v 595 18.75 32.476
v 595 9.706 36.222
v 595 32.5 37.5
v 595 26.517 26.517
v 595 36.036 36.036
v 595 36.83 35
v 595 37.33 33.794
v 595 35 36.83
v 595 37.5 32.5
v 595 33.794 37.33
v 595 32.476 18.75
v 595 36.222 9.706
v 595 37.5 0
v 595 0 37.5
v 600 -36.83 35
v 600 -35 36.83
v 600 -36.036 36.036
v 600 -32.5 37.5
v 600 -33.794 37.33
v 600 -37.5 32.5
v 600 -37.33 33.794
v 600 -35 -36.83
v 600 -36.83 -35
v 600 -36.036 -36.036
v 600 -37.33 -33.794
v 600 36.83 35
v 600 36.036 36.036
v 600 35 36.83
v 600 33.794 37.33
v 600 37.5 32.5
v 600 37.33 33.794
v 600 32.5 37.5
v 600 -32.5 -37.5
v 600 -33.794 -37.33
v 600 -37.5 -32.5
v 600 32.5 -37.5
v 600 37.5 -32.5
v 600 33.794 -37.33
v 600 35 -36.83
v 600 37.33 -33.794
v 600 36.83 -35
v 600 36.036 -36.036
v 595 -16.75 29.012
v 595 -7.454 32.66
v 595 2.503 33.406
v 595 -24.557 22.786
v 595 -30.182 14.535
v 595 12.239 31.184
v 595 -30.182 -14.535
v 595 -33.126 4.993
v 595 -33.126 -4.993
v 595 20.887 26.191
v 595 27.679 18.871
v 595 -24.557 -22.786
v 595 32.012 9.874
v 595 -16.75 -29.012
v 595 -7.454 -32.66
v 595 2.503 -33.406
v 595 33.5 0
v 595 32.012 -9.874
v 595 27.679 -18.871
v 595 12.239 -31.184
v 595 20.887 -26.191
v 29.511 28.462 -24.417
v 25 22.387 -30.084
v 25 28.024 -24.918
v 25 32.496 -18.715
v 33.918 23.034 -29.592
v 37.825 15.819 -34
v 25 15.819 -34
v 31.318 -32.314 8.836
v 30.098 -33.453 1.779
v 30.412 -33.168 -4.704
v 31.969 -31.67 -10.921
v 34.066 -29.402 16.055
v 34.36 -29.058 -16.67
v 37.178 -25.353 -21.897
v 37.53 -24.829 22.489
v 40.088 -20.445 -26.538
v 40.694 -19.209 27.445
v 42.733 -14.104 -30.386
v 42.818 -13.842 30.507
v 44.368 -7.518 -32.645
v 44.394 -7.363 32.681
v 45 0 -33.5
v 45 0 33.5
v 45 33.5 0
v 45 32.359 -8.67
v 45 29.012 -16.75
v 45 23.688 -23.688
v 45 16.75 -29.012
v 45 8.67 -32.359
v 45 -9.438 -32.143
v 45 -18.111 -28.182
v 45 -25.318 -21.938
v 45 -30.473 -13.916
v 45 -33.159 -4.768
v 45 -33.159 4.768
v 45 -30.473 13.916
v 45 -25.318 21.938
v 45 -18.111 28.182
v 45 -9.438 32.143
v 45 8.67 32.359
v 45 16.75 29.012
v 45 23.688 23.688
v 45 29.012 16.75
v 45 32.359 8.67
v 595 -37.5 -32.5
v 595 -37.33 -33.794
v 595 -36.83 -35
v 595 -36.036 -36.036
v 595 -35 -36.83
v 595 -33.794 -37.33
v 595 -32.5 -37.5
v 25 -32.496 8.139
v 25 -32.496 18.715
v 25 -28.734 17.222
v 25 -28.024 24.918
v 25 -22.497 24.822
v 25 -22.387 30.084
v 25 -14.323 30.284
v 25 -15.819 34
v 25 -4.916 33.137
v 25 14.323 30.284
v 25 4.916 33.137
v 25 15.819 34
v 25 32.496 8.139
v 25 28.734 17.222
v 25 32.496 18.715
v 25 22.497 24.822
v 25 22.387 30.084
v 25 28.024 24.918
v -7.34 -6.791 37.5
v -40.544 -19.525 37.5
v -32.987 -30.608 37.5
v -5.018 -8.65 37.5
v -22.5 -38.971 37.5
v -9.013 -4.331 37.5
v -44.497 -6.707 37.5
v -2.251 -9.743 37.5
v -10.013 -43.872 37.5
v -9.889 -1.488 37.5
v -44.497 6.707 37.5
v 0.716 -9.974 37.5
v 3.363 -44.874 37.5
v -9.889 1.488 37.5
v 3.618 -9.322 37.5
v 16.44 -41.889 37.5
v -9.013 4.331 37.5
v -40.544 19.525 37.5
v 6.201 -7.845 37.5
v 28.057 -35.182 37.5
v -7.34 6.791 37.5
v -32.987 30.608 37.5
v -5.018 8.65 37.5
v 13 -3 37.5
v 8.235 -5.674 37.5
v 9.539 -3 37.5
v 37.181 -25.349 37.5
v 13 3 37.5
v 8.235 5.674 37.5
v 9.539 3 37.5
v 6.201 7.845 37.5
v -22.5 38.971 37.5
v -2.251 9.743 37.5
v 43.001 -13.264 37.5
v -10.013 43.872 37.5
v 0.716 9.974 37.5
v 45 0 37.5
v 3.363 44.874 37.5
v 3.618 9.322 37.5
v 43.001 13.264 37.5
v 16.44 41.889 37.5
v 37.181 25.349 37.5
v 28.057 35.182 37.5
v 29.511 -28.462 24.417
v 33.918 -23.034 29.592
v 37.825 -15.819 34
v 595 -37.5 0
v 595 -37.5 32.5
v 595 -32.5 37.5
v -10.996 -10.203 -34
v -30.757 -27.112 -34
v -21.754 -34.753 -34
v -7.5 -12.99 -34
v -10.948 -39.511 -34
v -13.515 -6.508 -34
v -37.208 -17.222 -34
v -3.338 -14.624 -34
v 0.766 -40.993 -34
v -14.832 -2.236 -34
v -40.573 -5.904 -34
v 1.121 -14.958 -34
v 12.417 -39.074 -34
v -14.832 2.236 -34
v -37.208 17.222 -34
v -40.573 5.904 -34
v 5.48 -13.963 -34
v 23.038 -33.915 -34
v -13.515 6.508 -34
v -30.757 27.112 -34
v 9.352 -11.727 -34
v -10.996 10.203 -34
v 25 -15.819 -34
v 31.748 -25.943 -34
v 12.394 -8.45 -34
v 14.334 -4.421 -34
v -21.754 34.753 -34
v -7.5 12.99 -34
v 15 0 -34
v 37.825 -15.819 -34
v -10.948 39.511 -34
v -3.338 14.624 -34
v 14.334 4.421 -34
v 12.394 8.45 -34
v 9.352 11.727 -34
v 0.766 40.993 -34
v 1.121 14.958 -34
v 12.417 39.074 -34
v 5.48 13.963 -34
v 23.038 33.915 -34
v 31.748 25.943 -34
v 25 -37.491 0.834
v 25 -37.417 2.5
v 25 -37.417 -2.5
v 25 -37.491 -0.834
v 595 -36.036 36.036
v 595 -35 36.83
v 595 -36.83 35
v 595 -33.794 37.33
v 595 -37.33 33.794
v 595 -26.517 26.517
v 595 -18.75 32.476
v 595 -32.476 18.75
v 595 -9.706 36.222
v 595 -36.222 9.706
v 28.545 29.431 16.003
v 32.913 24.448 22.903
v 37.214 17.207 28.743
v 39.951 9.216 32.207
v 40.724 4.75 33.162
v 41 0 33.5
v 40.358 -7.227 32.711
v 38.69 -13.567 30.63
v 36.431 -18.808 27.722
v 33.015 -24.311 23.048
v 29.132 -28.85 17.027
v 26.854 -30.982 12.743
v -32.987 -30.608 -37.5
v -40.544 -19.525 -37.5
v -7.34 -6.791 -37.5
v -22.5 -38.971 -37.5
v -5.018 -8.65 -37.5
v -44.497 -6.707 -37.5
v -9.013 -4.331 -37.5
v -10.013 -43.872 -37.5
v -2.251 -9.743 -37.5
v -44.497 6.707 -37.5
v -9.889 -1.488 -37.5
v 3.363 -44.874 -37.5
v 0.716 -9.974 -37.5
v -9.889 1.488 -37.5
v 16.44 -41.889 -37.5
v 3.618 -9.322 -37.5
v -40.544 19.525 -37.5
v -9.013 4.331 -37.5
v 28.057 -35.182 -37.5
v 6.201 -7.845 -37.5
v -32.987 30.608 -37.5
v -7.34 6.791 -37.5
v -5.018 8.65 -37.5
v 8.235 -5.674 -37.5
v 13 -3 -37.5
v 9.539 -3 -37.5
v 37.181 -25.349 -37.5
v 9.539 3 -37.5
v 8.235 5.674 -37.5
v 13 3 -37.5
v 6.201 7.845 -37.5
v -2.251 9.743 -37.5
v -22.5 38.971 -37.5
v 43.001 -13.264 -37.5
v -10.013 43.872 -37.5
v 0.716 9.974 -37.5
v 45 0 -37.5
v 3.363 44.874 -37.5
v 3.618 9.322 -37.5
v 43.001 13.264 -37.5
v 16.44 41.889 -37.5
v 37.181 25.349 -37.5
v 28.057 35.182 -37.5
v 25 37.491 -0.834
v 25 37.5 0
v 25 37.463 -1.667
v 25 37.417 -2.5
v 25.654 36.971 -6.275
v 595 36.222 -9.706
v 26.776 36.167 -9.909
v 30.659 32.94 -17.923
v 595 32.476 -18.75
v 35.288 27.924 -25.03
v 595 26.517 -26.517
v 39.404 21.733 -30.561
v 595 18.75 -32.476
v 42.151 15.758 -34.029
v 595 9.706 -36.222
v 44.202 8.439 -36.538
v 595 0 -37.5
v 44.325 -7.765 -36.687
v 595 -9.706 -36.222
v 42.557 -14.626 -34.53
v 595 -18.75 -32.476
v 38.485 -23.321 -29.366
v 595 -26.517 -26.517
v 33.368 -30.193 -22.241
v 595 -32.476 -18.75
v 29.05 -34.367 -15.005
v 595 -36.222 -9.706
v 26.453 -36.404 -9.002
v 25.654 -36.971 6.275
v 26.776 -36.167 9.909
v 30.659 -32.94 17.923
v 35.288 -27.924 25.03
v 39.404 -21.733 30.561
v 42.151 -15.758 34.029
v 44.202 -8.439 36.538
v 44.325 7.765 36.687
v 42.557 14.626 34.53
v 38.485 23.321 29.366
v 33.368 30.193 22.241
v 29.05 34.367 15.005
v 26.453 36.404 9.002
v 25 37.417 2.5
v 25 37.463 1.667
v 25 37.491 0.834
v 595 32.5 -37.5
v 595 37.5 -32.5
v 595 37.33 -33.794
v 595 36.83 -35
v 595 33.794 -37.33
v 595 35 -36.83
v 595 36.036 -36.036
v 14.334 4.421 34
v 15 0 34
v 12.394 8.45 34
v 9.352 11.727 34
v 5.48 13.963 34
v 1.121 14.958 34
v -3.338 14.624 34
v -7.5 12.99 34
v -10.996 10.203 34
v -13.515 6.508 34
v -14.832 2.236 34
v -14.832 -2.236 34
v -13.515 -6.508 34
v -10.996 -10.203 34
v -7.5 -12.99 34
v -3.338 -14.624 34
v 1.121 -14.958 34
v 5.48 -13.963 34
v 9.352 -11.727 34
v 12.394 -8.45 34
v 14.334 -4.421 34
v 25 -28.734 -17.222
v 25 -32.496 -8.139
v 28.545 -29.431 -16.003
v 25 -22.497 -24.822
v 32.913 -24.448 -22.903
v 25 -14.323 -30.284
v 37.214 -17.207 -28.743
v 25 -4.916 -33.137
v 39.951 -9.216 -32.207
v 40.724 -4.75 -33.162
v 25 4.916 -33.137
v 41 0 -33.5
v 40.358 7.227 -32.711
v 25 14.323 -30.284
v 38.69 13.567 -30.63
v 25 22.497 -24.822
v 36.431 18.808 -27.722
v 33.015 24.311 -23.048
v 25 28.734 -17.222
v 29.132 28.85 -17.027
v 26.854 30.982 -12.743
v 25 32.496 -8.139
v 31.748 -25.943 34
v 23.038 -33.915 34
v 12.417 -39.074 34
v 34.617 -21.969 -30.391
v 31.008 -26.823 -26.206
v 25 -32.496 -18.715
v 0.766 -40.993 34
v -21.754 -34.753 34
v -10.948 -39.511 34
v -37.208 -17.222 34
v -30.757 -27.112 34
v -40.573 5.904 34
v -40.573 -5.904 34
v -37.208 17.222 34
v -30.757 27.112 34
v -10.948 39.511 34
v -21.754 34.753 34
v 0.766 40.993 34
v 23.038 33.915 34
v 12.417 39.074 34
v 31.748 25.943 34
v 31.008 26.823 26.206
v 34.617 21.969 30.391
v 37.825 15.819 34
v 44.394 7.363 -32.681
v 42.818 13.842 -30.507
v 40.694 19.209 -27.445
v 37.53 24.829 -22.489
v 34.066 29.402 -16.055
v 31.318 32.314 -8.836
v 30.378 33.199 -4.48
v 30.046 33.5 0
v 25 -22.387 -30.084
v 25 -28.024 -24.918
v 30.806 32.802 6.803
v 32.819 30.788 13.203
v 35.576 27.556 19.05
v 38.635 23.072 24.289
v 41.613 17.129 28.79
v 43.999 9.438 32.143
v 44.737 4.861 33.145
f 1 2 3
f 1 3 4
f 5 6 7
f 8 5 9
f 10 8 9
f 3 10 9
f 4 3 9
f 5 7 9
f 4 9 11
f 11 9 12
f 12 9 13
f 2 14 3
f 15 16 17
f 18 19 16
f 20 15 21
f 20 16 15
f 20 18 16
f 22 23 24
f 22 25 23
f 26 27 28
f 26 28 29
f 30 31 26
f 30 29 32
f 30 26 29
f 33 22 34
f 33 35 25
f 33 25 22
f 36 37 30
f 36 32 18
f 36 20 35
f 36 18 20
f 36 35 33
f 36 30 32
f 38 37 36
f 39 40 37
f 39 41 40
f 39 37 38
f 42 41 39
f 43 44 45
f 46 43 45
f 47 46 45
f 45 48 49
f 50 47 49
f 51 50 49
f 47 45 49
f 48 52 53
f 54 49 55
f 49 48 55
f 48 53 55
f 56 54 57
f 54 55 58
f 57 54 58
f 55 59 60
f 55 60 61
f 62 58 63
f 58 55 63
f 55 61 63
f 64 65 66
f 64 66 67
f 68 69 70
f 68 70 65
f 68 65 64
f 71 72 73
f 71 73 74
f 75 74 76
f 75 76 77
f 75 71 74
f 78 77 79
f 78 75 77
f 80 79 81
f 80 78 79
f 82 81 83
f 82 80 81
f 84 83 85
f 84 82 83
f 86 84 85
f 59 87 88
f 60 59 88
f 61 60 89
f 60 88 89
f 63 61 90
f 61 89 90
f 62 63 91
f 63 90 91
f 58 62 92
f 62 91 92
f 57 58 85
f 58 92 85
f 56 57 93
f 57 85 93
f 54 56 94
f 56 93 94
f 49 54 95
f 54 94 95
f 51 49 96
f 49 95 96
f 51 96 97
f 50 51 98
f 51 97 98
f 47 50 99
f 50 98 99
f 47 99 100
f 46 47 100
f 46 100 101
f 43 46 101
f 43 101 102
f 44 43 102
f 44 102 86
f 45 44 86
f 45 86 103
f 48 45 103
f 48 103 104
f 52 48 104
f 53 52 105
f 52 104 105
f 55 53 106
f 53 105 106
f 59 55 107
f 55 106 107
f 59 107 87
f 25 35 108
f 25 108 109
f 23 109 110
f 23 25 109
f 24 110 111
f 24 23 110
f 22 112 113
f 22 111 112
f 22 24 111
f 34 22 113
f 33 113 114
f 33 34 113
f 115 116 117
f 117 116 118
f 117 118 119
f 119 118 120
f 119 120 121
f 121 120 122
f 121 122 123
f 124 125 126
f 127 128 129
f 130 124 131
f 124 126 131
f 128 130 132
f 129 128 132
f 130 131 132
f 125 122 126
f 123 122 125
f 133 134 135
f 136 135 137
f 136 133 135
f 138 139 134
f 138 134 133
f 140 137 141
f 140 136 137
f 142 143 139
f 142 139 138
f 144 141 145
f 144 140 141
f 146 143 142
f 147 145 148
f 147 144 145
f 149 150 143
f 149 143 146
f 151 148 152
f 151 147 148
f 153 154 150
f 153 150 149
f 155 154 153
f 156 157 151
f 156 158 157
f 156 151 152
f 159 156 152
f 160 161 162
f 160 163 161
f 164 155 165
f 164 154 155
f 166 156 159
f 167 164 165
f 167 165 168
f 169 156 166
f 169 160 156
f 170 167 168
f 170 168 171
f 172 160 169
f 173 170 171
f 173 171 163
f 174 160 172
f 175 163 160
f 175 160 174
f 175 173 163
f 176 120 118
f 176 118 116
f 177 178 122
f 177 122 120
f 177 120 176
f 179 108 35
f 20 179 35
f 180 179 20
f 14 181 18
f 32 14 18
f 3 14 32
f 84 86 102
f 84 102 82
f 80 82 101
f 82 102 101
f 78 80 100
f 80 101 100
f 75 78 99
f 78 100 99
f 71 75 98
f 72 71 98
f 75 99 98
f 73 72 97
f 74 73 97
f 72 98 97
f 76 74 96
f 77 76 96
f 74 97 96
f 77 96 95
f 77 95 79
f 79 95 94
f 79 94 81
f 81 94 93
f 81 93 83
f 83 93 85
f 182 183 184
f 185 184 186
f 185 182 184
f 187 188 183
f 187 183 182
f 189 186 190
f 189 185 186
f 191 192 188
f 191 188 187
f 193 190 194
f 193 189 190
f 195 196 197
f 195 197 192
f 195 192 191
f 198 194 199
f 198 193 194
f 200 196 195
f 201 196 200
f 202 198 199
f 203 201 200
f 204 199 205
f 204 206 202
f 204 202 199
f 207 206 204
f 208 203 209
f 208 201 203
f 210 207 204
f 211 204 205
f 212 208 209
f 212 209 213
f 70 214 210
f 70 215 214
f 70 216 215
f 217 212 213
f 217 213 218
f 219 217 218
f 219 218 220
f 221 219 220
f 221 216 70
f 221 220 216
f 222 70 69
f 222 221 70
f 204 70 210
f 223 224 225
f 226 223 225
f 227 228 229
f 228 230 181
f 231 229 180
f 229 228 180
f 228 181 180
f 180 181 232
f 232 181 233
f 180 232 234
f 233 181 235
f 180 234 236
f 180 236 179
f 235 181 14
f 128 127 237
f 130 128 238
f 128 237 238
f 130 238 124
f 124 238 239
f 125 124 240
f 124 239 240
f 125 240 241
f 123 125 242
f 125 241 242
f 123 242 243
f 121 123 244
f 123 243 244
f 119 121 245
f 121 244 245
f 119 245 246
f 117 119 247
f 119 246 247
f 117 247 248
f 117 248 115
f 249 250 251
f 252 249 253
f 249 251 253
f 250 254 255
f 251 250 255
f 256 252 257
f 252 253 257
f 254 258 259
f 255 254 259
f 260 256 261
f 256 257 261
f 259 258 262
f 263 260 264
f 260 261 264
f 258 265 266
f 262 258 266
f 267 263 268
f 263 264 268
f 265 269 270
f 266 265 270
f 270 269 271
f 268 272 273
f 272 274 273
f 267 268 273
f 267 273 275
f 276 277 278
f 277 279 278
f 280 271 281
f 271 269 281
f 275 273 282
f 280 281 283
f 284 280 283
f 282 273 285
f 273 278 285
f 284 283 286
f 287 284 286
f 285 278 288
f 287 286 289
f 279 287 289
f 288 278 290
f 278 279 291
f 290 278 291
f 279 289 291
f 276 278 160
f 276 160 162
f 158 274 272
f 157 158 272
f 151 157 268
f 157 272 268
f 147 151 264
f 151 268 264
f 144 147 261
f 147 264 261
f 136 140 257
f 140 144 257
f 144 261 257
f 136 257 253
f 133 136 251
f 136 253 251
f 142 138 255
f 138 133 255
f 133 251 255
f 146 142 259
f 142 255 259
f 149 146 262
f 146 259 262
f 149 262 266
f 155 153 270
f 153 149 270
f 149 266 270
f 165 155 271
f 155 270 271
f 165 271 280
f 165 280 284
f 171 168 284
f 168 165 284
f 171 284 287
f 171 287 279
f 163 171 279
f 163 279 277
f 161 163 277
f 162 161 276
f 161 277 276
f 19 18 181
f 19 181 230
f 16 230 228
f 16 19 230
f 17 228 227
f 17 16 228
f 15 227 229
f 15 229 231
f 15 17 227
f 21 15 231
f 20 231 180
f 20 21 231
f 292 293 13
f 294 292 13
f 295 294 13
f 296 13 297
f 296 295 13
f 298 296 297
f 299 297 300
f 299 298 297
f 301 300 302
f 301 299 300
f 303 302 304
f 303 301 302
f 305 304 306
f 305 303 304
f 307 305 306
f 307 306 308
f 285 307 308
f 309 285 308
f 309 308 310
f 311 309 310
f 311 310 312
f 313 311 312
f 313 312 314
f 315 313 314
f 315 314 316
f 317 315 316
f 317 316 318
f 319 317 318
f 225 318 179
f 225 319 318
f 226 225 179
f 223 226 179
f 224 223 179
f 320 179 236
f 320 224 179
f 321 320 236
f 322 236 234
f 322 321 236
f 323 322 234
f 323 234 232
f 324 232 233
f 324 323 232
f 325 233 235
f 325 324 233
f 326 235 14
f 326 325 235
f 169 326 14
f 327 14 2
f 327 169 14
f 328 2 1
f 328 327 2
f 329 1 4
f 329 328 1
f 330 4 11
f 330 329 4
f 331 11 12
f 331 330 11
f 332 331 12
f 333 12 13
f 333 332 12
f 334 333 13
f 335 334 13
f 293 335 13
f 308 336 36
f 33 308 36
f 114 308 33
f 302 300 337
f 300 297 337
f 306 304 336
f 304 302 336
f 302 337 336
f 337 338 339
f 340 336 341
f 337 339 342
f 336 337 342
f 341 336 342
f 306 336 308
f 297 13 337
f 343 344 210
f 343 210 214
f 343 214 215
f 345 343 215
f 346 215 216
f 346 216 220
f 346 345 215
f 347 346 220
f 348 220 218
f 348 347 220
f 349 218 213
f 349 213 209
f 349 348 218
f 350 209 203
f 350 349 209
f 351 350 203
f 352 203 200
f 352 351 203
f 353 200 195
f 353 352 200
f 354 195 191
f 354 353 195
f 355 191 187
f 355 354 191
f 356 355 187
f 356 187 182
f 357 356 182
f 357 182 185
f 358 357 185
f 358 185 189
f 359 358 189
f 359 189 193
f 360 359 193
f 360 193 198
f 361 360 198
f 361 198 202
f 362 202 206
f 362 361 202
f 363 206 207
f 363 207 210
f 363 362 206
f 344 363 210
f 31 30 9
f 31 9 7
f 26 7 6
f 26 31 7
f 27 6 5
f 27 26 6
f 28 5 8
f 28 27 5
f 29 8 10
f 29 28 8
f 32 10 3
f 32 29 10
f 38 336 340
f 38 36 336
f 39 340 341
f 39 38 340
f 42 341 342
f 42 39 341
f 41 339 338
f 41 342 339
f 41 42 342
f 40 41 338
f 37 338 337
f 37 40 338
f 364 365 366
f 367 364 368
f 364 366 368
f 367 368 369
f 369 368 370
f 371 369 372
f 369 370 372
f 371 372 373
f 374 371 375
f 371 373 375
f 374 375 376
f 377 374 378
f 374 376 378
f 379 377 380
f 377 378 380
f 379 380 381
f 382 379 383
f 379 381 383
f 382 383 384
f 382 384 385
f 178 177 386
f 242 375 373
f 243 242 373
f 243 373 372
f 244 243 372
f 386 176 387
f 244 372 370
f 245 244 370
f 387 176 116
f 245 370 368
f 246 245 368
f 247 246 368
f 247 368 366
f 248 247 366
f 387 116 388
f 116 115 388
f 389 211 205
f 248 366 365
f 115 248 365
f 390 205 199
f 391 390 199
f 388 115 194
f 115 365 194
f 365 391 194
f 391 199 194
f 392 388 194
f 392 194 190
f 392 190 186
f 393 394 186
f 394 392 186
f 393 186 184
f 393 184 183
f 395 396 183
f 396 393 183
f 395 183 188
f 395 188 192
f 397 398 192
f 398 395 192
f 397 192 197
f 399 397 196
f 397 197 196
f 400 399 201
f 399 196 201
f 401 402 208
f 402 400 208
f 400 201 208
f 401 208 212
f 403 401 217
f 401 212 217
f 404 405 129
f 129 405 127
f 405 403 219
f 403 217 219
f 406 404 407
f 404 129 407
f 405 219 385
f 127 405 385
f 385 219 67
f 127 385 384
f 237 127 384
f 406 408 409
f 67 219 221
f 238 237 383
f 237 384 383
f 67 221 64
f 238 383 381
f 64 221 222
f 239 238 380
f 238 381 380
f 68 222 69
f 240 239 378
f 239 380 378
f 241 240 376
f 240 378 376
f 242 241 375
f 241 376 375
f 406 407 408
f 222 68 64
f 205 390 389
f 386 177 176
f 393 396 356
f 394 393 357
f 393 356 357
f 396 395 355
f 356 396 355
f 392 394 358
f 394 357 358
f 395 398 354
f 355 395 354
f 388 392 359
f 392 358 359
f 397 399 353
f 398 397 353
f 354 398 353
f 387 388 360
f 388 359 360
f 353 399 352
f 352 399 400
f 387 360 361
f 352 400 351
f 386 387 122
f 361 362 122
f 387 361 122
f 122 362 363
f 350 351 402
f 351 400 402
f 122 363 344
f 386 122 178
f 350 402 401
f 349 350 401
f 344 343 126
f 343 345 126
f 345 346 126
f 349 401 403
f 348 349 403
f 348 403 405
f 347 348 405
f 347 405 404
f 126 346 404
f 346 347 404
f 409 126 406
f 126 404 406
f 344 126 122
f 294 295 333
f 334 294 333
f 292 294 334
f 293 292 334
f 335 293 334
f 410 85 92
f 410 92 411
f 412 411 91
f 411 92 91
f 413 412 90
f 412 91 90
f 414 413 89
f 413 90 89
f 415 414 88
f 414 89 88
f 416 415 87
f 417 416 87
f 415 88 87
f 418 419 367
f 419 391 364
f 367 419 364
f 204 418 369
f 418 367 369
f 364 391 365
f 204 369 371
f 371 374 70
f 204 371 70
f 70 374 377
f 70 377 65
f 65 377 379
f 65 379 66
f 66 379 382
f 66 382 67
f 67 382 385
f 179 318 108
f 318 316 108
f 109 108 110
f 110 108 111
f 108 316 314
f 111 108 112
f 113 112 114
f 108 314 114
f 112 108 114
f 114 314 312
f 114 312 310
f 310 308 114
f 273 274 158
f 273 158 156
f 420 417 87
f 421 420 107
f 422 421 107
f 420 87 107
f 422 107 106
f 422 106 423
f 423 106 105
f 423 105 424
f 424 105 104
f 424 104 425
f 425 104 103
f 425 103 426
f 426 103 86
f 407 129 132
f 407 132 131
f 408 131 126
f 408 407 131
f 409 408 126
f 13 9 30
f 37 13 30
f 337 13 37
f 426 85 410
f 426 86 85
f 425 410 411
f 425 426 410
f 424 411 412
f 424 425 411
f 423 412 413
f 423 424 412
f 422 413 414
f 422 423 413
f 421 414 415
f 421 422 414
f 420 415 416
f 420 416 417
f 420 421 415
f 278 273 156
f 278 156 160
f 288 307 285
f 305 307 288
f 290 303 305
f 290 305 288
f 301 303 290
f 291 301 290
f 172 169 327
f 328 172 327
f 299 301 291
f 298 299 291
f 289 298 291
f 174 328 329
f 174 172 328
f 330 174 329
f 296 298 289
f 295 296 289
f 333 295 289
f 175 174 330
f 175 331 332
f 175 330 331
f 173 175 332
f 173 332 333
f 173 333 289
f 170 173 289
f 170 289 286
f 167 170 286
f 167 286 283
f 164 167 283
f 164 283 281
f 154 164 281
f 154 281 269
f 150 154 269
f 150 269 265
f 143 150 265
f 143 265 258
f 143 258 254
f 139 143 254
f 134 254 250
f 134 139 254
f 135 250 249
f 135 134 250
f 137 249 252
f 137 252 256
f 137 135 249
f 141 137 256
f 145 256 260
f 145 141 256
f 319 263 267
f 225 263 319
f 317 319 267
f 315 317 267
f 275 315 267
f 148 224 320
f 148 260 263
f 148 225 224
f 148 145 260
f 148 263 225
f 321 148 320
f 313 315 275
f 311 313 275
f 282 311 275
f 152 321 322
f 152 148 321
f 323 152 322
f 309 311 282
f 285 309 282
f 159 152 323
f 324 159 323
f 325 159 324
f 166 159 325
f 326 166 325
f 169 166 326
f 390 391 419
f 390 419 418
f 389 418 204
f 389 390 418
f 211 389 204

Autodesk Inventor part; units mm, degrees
ref_plane "XZ Plane" through (0, 0, 0) normal (0, 1, 0) x (-1, 0, 0)
ref_plane "XY Plane" through (0, 0, 0) normal (0, 0, 1) x (1, 0, 0)
sketch "Szkic3" plane through (0, 0, 0) normal (0, 0, 1) x (1, 0, 0)
  circle A0 centre (0, 0) radius 45
  circle A1 centre (0, 0) radius 41
  circle A2 centre (0, 0) radius 15
  arc A3 (9.5394, 3) -> (9.5394, -3) centre (0, 0) ccw
  line L0 (13, 3) -> (9.5394, 3)
  line L1 (9.5394, -3) -> (13, -3)
  line L2 (13, -3) -> (13, 3)
  line L3 (13, 3) -> (10, 0) construction
  line L4 (10, 0) -> (13, -3) construction
  dimension "d0" = 90
  dimension "d1" = 82
  dimension "d3" = 30
  dimension "d19" = 20
extrude "Wyciągnięcie proste1" add sketch "Szkic3" along normal mid plane 75 contours A0 | A1 | A2 | L0 L2 L1 A3
extrude "Wyciągnięcie proste2" cut sketch "Szkic3" along normal mid plane 68 contours A1
ref_plane "Płaszczyzna konstrukcyjna1" through (45, 0, 0) normal (1, 0, 0) x (0, 1, 0)
sketch "Szkic4" plane through (45, 0, 0) normal (1, 0, 0) x (0, 1, 0)
  circle A0 centre (0, 0) radius 37.5
  circle A1 centre (0, 0) radius 33.5
  dimension "d10" = 67
extrude "Wyciągnięcie proste3" add sketch "Szkic4" along normal blind 550 and the other way blind 20
sketch "Szkic5" plane through (595, 0, 0) normal (1, 0, 0) x (0, 0, -1)
  line L0 (-37.5, 37.5) -> (37.5, 37.5)
  line L1 (37.5, 37.5) -> (37.5, -37.5)
  line L2 (37.5, -37.5) -> (-37.5, -37.5)
  line L3 (-37.5, -37.5) -> (-37.5, 37.5)
  line L4 (-37.5, 37.5) -> (37.5, -37.5) construction
  line L5 (37.5, 37.5) -> (-37.5, -37.5) construction
  point P0 (0, 0)
  point P1 (37.5, 0)
  dimension "d15" = 75
extrude "Wyciągnięcie proste4" add sketch "Szkic5" along normal blind 5
fillet "Zaokrąglenie1" radius 5 4 edges at (597.5, 37.5, 37.5) (597.5, 37.5, -37.5) (597.5, -37.5, 37.5) (597.5, -37.5, -37.5)
extrude "Wyciągnięcie proste5" cut sketch "Szkic3" along normal mid plane 75 contours L0 L2 L1 A3
properties part number "czlon 3" material "CFRP — polimer wzmocniony włóknem szklanym"
